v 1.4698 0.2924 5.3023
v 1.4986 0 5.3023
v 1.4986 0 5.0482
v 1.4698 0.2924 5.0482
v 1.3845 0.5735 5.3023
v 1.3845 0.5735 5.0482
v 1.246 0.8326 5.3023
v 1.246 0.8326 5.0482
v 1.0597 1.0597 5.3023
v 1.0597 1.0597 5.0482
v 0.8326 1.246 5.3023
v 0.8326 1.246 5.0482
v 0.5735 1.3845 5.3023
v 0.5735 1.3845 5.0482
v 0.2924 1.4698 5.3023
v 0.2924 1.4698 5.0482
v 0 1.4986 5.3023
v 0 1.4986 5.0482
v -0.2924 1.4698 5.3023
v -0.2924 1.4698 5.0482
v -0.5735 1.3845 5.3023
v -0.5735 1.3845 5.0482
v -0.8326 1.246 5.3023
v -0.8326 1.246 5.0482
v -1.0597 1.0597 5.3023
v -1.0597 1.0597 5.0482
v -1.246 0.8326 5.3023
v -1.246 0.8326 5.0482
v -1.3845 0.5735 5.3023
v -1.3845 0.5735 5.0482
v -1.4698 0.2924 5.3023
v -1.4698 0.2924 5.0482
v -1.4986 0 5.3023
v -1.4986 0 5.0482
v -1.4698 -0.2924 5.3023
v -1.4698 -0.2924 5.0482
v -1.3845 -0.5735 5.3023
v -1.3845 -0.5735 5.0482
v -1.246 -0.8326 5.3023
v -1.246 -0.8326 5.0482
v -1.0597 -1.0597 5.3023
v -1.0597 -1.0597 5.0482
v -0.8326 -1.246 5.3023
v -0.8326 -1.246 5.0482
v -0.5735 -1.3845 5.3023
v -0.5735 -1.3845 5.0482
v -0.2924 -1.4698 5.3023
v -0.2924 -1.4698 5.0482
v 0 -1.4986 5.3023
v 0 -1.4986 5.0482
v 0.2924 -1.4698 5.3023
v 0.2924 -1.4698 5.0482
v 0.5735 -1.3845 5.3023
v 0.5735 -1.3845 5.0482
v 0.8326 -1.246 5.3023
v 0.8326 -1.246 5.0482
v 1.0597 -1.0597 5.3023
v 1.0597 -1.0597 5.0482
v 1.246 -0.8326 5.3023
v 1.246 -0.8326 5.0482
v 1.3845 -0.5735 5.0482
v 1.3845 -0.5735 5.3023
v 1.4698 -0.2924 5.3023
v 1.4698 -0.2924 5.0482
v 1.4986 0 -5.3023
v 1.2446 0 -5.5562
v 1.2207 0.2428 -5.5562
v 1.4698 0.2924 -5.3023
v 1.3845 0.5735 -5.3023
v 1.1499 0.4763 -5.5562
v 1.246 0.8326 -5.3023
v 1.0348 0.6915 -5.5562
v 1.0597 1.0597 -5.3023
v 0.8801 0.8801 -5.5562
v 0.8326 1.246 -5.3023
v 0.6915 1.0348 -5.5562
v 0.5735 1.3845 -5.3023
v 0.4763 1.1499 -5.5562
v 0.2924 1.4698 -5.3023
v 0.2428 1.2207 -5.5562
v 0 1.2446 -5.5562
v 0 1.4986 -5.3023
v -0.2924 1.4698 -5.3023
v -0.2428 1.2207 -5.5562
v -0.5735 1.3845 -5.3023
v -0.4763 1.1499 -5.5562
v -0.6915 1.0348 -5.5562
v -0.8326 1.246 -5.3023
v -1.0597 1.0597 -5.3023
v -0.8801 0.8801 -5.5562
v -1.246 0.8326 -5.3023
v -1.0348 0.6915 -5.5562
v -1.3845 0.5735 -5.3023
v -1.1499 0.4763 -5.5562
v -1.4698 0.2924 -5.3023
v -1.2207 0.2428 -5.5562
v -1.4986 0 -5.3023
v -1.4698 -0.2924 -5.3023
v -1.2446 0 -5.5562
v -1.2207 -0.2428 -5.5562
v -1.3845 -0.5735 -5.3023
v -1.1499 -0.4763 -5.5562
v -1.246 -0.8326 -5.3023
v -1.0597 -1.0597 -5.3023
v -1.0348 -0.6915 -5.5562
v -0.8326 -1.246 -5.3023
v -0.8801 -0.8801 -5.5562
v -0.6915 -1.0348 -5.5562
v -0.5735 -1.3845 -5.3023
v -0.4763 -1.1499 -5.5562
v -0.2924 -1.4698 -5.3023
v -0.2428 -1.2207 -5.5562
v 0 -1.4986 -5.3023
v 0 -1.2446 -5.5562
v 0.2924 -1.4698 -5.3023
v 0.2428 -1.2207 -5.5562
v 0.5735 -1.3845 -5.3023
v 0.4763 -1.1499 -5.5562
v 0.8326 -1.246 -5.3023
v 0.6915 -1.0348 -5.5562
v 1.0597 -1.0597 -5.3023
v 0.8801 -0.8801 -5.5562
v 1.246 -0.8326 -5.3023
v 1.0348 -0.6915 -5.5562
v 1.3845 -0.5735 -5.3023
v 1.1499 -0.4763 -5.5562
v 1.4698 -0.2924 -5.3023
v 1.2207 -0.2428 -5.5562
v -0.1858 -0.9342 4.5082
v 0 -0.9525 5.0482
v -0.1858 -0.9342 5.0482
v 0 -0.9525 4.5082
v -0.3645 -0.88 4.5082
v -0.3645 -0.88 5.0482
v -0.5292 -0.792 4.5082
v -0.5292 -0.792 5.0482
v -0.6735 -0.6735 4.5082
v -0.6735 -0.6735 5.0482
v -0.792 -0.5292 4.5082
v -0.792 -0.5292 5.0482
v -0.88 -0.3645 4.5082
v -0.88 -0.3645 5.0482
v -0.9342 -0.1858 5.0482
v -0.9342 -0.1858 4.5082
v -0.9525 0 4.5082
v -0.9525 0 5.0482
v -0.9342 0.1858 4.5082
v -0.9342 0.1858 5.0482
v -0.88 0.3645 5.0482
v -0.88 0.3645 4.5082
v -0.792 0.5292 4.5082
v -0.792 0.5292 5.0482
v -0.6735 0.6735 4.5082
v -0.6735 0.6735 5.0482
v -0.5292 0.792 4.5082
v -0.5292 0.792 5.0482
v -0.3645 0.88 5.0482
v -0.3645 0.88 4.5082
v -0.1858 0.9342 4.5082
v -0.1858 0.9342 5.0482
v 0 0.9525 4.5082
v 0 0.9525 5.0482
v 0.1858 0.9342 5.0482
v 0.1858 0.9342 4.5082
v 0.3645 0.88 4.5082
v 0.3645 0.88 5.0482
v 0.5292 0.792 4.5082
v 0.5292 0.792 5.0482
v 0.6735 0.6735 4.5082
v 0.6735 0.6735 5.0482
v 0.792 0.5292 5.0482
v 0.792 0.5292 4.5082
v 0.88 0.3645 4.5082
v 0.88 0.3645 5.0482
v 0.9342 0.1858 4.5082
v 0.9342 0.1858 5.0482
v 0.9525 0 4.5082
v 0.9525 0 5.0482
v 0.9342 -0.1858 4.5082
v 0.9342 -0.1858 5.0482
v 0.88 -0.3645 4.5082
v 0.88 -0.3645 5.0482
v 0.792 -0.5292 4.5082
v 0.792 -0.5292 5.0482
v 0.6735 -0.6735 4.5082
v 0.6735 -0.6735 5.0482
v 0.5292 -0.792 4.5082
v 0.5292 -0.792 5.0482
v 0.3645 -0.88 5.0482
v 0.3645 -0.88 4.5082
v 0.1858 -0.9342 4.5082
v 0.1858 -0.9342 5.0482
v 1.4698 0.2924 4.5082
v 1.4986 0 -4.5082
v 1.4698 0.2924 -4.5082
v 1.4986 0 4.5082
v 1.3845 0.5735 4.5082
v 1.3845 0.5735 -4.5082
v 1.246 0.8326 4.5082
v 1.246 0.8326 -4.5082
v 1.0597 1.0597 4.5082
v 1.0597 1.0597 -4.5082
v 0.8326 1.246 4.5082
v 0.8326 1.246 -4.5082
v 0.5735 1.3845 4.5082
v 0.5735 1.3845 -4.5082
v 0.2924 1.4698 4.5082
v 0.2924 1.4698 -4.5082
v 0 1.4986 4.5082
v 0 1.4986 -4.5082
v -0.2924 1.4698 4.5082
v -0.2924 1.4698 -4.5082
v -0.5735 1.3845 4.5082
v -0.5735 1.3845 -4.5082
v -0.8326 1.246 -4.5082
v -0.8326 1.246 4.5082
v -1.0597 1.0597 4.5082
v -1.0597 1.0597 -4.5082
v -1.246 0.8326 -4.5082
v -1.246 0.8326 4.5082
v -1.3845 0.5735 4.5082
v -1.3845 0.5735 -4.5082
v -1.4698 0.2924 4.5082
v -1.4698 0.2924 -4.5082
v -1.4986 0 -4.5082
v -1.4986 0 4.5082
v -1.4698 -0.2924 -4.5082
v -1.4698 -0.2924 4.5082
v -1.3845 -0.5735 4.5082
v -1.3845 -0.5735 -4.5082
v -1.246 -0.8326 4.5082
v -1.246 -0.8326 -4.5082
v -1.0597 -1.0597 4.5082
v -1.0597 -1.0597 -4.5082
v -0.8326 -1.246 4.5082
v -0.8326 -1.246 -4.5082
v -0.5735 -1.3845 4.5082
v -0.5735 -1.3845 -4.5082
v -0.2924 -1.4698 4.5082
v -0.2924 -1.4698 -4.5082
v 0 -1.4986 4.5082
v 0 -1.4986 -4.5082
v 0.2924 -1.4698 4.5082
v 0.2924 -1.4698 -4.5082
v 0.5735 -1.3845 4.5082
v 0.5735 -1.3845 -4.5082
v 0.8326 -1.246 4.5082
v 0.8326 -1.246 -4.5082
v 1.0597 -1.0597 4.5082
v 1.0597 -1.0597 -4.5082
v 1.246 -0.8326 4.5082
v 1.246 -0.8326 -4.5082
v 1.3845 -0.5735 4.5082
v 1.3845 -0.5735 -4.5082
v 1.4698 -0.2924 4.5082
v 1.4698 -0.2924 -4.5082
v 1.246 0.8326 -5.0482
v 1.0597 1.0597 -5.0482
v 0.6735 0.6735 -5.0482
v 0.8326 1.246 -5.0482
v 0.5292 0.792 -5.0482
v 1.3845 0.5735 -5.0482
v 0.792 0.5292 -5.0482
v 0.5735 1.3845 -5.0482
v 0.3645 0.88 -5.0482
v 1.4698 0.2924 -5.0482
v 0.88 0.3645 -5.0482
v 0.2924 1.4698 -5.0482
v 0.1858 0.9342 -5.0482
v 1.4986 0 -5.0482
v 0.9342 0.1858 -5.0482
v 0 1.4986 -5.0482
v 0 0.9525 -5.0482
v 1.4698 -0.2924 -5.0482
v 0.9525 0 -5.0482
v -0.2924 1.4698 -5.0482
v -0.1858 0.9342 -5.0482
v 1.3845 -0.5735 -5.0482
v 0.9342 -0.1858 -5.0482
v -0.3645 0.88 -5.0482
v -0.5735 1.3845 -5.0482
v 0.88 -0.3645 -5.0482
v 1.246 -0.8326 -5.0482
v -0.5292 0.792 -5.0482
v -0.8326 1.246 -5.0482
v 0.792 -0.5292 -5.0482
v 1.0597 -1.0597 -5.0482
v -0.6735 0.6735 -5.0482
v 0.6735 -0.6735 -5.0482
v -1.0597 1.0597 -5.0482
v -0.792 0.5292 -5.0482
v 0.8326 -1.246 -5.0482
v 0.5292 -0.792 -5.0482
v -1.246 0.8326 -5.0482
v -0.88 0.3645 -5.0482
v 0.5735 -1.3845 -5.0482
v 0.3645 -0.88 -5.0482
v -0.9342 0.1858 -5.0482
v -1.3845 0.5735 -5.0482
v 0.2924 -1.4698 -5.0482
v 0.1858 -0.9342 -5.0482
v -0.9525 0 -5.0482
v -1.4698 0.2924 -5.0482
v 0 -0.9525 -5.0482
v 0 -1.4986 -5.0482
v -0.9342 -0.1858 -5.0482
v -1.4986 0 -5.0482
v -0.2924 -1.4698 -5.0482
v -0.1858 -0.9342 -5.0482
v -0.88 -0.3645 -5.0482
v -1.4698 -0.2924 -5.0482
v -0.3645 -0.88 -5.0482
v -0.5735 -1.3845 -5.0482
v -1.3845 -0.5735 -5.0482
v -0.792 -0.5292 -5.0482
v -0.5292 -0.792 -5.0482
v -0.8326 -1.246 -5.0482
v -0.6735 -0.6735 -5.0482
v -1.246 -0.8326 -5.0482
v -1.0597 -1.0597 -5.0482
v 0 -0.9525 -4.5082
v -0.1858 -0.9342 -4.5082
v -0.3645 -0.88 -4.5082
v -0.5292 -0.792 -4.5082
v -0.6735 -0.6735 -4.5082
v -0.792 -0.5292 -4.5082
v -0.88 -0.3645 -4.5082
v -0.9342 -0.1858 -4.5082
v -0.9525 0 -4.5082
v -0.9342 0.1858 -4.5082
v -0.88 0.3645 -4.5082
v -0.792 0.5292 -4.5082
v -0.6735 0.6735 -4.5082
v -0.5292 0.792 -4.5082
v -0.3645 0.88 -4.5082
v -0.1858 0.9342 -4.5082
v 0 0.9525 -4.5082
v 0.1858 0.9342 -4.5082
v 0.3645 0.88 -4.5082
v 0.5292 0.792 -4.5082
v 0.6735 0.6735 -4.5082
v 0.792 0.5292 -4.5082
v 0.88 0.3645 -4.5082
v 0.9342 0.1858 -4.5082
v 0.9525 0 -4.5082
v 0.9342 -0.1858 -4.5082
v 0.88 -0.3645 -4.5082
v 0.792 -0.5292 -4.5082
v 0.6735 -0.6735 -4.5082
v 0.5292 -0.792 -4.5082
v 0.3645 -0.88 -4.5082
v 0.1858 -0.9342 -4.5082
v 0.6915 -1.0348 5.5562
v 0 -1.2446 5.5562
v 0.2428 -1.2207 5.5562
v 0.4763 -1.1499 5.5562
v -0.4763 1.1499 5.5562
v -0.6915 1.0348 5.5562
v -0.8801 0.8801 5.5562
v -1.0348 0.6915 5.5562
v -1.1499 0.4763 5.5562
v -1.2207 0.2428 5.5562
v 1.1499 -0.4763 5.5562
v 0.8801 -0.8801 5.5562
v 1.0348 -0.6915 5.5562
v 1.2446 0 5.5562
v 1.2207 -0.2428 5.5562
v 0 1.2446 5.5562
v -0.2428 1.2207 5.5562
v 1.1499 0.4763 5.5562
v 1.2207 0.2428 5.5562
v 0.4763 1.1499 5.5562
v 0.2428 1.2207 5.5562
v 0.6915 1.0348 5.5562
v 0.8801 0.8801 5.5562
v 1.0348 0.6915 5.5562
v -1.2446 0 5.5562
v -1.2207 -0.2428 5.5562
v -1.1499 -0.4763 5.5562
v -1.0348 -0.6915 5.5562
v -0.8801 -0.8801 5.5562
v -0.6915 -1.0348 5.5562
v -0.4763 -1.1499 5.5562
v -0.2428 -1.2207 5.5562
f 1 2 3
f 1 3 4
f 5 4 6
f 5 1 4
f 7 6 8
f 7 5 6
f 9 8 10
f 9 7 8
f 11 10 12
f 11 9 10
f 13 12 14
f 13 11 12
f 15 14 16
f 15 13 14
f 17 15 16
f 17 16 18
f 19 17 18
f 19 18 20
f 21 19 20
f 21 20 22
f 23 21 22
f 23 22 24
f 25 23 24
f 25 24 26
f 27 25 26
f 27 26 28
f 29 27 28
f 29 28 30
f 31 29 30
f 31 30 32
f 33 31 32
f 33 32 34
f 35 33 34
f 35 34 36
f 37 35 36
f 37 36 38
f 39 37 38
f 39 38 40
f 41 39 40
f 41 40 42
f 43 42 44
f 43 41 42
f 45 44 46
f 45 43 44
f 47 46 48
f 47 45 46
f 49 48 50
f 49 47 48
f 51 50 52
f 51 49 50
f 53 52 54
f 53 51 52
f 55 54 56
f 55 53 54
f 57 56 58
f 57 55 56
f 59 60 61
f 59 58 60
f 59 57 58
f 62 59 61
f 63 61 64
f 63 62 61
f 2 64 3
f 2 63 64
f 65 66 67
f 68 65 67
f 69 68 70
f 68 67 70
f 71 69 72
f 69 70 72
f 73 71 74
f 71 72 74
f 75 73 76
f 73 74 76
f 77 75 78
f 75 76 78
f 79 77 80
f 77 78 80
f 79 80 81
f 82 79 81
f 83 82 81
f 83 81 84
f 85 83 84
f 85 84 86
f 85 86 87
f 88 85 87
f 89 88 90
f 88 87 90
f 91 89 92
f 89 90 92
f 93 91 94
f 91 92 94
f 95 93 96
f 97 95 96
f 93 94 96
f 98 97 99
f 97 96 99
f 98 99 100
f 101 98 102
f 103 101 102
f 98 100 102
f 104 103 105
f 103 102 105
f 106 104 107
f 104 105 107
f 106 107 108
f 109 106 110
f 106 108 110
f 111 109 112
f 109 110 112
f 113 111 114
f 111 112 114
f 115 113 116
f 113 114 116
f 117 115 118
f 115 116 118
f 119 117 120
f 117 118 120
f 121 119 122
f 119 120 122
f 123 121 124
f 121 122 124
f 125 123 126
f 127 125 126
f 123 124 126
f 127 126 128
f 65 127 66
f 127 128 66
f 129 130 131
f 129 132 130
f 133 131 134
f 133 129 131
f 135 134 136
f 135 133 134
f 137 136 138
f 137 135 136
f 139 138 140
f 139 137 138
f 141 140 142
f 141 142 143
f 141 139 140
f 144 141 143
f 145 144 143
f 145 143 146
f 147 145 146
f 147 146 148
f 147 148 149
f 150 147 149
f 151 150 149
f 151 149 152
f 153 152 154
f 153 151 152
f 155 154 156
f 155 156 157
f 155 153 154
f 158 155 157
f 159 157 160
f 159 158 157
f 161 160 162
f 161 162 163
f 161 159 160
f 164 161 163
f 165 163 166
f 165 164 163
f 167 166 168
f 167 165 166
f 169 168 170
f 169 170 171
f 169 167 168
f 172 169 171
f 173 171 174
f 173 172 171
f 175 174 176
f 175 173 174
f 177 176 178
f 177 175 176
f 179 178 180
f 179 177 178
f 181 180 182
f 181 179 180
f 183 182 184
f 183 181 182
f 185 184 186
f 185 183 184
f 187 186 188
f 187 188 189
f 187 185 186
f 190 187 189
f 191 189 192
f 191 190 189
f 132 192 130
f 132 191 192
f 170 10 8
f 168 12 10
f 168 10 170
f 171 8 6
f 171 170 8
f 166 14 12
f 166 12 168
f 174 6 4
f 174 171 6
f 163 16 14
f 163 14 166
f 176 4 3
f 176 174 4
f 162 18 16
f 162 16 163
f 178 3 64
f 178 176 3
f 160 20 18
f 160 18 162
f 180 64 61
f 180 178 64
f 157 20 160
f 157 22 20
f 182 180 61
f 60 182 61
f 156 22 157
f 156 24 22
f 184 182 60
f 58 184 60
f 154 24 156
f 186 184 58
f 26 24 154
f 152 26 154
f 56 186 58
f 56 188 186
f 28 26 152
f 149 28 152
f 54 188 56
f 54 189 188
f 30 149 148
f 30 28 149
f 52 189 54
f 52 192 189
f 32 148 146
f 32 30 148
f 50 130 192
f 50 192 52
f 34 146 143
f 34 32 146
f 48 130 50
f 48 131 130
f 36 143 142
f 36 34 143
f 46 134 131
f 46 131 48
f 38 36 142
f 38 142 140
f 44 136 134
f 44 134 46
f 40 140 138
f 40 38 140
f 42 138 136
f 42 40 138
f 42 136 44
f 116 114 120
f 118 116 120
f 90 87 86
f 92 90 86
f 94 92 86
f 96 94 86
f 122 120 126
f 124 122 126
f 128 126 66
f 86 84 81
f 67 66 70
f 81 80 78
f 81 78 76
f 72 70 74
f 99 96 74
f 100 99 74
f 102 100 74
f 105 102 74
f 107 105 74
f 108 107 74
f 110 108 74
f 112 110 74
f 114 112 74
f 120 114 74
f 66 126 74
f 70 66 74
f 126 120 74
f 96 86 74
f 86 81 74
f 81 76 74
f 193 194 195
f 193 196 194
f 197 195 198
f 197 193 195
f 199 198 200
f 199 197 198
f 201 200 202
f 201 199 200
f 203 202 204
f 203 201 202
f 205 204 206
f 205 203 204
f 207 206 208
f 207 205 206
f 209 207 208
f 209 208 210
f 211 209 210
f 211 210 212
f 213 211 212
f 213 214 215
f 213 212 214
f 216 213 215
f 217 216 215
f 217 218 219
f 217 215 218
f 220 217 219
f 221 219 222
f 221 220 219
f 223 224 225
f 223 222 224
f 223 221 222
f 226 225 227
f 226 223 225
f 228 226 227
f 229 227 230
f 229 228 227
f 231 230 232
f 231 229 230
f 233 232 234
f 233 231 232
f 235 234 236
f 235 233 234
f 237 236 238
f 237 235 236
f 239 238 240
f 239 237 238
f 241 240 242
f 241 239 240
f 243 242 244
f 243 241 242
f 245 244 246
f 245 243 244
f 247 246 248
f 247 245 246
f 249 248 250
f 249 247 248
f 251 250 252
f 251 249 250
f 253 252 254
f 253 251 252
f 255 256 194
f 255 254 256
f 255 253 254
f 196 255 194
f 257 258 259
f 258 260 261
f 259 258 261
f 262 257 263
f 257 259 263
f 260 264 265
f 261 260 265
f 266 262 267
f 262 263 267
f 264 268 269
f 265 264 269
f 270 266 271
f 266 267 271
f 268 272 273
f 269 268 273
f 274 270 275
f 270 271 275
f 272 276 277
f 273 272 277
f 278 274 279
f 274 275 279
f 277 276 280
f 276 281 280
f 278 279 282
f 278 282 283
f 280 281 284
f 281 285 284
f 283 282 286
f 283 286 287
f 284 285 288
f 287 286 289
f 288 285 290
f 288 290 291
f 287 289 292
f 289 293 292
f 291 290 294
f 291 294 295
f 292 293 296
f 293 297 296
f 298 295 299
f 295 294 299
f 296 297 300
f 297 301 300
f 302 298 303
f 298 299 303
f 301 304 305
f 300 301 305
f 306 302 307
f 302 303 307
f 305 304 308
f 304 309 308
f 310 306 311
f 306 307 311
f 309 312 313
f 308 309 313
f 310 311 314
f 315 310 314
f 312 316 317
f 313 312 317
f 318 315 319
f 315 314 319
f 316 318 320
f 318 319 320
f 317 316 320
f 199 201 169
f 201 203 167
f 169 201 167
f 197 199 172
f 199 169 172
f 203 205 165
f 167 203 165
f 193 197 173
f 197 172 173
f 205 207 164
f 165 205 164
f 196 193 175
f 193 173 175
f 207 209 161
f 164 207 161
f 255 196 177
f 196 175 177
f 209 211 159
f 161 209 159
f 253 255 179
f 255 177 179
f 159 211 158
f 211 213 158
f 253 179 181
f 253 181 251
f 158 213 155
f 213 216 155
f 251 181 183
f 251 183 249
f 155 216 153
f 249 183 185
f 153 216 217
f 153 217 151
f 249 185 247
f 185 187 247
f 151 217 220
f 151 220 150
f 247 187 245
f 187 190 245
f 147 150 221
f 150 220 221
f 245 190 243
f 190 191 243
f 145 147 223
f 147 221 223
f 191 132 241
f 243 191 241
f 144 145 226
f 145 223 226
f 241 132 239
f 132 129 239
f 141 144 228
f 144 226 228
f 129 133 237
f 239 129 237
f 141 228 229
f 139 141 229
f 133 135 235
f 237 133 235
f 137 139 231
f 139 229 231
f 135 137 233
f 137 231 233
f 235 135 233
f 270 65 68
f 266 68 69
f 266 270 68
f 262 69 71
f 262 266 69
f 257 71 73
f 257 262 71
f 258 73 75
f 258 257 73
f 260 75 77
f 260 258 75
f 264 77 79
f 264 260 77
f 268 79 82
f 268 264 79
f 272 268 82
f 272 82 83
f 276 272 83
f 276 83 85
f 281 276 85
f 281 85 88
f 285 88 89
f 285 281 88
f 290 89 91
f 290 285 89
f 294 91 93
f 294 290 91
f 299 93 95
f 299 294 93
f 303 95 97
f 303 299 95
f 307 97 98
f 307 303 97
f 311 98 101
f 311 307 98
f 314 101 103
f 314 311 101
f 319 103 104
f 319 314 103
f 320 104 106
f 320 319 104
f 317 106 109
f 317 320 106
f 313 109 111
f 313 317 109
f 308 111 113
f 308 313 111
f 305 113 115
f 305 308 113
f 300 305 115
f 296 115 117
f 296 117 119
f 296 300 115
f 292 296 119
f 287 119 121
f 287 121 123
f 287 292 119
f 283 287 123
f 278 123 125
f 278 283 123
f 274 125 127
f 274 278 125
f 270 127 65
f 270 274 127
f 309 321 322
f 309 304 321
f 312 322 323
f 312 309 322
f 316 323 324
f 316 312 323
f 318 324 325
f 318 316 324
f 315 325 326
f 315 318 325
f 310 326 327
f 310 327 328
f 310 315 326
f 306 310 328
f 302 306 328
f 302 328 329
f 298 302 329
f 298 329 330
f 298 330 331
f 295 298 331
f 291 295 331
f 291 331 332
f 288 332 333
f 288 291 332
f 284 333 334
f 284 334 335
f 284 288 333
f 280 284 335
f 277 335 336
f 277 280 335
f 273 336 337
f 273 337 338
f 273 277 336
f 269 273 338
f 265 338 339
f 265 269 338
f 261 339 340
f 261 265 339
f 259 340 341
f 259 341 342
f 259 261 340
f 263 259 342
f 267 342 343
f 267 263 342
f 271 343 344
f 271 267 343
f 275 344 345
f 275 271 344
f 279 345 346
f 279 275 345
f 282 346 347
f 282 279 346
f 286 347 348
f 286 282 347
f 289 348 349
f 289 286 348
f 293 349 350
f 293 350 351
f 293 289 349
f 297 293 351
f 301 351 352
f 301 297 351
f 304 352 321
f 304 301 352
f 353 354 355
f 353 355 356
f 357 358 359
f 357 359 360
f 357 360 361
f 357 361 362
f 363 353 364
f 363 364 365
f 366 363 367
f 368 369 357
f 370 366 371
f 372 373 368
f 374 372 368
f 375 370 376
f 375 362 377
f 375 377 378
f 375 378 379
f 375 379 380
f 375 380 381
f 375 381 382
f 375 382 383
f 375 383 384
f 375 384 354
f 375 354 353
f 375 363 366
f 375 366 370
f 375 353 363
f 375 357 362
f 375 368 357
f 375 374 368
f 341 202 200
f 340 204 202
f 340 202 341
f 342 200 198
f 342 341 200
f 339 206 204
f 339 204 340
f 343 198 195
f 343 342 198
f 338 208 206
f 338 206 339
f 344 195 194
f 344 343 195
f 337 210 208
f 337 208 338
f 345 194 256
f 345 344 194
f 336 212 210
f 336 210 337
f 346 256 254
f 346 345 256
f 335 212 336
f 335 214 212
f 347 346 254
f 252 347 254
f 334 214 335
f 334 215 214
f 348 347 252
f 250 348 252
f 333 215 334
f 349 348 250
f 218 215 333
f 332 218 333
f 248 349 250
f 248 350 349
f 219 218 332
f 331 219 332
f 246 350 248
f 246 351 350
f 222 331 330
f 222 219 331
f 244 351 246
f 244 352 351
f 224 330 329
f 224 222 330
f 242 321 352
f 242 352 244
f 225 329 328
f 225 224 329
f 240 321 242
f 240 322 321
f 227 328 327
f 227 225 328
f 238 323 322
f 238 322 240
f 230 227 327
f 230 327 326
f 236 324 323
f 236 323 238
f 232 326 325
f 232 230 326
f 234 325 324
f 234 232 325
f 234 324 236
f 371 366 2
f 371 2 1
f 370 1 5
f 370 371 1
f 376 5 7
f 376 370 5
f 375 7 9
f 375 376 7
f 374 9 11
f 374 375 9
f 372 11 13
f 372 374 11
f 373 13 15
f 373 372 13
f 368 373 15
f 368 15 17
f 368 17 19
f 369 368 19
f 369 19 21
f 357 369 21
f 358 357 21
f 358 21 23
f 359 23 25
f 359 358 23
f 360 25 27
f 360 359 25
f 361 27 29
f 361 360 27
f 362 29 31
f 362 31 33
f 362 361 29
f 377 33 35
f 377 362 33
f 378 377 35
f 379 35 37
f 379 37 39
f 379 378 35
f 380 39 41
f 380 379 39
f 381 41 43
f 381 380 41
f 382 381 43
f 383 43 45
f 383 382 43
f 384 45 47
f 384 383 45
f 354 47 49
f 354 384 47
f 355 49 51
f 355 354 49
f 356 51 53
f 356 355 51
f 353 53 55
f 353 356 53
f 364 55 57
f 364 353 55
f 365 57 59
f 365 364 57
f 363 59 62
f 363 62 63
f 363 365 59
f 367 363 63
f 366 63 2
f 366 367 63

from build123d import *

# Parameters (mm, degrees)
SKETCH1_R           = 1.4986
BOSS_EXTRUDE1_DEPTH = 5.55625
SKETCH2_W           = 0.54
SKETCH2_H           = 0.5461
CHAMFER1_SIZE       = 0.254


with BuildPart() as part:
    # Sketch1 → Boss-Extrude1 (new body, symmetric)
    with BuildSketch(Plane.XY):
        Circle(SKETCH1_R)
    extrude(amount=BOSS_EXTRUDE1_DEPTH, both=True)

    # Sketch2 → Cut-Revolve1 (revolve, cut)
    with BuildSketch(Plane(origin=(0, 0, 0), x_dir=(0, 0, -1), z_dir=(1, 0, 0))):
        with Locations((-4.77825, -1.22555)):
            Rectangle(SKETCH2_W, SKETCH2_H)
        with Locations((4.77825, -1.22555)):
            Rectangle(SKETCH2_W, SKETCH2_H)
    revolve(axis=Axis((0, 0, 8.828032455), (0, 0, -1)), mode=Mode.SUBTRACT)

    # Chamfer1
    chamfer1_edges = [part.edges().sort_by_distance(p)[0] for p in [
        (-1.4986, 0, -5.55625),
        (-1.4986, 0, 5.55625),
    ]]
    chamfer(chamfer1_edges, length=CHAMFER1_SIZE)


solid = part.part
